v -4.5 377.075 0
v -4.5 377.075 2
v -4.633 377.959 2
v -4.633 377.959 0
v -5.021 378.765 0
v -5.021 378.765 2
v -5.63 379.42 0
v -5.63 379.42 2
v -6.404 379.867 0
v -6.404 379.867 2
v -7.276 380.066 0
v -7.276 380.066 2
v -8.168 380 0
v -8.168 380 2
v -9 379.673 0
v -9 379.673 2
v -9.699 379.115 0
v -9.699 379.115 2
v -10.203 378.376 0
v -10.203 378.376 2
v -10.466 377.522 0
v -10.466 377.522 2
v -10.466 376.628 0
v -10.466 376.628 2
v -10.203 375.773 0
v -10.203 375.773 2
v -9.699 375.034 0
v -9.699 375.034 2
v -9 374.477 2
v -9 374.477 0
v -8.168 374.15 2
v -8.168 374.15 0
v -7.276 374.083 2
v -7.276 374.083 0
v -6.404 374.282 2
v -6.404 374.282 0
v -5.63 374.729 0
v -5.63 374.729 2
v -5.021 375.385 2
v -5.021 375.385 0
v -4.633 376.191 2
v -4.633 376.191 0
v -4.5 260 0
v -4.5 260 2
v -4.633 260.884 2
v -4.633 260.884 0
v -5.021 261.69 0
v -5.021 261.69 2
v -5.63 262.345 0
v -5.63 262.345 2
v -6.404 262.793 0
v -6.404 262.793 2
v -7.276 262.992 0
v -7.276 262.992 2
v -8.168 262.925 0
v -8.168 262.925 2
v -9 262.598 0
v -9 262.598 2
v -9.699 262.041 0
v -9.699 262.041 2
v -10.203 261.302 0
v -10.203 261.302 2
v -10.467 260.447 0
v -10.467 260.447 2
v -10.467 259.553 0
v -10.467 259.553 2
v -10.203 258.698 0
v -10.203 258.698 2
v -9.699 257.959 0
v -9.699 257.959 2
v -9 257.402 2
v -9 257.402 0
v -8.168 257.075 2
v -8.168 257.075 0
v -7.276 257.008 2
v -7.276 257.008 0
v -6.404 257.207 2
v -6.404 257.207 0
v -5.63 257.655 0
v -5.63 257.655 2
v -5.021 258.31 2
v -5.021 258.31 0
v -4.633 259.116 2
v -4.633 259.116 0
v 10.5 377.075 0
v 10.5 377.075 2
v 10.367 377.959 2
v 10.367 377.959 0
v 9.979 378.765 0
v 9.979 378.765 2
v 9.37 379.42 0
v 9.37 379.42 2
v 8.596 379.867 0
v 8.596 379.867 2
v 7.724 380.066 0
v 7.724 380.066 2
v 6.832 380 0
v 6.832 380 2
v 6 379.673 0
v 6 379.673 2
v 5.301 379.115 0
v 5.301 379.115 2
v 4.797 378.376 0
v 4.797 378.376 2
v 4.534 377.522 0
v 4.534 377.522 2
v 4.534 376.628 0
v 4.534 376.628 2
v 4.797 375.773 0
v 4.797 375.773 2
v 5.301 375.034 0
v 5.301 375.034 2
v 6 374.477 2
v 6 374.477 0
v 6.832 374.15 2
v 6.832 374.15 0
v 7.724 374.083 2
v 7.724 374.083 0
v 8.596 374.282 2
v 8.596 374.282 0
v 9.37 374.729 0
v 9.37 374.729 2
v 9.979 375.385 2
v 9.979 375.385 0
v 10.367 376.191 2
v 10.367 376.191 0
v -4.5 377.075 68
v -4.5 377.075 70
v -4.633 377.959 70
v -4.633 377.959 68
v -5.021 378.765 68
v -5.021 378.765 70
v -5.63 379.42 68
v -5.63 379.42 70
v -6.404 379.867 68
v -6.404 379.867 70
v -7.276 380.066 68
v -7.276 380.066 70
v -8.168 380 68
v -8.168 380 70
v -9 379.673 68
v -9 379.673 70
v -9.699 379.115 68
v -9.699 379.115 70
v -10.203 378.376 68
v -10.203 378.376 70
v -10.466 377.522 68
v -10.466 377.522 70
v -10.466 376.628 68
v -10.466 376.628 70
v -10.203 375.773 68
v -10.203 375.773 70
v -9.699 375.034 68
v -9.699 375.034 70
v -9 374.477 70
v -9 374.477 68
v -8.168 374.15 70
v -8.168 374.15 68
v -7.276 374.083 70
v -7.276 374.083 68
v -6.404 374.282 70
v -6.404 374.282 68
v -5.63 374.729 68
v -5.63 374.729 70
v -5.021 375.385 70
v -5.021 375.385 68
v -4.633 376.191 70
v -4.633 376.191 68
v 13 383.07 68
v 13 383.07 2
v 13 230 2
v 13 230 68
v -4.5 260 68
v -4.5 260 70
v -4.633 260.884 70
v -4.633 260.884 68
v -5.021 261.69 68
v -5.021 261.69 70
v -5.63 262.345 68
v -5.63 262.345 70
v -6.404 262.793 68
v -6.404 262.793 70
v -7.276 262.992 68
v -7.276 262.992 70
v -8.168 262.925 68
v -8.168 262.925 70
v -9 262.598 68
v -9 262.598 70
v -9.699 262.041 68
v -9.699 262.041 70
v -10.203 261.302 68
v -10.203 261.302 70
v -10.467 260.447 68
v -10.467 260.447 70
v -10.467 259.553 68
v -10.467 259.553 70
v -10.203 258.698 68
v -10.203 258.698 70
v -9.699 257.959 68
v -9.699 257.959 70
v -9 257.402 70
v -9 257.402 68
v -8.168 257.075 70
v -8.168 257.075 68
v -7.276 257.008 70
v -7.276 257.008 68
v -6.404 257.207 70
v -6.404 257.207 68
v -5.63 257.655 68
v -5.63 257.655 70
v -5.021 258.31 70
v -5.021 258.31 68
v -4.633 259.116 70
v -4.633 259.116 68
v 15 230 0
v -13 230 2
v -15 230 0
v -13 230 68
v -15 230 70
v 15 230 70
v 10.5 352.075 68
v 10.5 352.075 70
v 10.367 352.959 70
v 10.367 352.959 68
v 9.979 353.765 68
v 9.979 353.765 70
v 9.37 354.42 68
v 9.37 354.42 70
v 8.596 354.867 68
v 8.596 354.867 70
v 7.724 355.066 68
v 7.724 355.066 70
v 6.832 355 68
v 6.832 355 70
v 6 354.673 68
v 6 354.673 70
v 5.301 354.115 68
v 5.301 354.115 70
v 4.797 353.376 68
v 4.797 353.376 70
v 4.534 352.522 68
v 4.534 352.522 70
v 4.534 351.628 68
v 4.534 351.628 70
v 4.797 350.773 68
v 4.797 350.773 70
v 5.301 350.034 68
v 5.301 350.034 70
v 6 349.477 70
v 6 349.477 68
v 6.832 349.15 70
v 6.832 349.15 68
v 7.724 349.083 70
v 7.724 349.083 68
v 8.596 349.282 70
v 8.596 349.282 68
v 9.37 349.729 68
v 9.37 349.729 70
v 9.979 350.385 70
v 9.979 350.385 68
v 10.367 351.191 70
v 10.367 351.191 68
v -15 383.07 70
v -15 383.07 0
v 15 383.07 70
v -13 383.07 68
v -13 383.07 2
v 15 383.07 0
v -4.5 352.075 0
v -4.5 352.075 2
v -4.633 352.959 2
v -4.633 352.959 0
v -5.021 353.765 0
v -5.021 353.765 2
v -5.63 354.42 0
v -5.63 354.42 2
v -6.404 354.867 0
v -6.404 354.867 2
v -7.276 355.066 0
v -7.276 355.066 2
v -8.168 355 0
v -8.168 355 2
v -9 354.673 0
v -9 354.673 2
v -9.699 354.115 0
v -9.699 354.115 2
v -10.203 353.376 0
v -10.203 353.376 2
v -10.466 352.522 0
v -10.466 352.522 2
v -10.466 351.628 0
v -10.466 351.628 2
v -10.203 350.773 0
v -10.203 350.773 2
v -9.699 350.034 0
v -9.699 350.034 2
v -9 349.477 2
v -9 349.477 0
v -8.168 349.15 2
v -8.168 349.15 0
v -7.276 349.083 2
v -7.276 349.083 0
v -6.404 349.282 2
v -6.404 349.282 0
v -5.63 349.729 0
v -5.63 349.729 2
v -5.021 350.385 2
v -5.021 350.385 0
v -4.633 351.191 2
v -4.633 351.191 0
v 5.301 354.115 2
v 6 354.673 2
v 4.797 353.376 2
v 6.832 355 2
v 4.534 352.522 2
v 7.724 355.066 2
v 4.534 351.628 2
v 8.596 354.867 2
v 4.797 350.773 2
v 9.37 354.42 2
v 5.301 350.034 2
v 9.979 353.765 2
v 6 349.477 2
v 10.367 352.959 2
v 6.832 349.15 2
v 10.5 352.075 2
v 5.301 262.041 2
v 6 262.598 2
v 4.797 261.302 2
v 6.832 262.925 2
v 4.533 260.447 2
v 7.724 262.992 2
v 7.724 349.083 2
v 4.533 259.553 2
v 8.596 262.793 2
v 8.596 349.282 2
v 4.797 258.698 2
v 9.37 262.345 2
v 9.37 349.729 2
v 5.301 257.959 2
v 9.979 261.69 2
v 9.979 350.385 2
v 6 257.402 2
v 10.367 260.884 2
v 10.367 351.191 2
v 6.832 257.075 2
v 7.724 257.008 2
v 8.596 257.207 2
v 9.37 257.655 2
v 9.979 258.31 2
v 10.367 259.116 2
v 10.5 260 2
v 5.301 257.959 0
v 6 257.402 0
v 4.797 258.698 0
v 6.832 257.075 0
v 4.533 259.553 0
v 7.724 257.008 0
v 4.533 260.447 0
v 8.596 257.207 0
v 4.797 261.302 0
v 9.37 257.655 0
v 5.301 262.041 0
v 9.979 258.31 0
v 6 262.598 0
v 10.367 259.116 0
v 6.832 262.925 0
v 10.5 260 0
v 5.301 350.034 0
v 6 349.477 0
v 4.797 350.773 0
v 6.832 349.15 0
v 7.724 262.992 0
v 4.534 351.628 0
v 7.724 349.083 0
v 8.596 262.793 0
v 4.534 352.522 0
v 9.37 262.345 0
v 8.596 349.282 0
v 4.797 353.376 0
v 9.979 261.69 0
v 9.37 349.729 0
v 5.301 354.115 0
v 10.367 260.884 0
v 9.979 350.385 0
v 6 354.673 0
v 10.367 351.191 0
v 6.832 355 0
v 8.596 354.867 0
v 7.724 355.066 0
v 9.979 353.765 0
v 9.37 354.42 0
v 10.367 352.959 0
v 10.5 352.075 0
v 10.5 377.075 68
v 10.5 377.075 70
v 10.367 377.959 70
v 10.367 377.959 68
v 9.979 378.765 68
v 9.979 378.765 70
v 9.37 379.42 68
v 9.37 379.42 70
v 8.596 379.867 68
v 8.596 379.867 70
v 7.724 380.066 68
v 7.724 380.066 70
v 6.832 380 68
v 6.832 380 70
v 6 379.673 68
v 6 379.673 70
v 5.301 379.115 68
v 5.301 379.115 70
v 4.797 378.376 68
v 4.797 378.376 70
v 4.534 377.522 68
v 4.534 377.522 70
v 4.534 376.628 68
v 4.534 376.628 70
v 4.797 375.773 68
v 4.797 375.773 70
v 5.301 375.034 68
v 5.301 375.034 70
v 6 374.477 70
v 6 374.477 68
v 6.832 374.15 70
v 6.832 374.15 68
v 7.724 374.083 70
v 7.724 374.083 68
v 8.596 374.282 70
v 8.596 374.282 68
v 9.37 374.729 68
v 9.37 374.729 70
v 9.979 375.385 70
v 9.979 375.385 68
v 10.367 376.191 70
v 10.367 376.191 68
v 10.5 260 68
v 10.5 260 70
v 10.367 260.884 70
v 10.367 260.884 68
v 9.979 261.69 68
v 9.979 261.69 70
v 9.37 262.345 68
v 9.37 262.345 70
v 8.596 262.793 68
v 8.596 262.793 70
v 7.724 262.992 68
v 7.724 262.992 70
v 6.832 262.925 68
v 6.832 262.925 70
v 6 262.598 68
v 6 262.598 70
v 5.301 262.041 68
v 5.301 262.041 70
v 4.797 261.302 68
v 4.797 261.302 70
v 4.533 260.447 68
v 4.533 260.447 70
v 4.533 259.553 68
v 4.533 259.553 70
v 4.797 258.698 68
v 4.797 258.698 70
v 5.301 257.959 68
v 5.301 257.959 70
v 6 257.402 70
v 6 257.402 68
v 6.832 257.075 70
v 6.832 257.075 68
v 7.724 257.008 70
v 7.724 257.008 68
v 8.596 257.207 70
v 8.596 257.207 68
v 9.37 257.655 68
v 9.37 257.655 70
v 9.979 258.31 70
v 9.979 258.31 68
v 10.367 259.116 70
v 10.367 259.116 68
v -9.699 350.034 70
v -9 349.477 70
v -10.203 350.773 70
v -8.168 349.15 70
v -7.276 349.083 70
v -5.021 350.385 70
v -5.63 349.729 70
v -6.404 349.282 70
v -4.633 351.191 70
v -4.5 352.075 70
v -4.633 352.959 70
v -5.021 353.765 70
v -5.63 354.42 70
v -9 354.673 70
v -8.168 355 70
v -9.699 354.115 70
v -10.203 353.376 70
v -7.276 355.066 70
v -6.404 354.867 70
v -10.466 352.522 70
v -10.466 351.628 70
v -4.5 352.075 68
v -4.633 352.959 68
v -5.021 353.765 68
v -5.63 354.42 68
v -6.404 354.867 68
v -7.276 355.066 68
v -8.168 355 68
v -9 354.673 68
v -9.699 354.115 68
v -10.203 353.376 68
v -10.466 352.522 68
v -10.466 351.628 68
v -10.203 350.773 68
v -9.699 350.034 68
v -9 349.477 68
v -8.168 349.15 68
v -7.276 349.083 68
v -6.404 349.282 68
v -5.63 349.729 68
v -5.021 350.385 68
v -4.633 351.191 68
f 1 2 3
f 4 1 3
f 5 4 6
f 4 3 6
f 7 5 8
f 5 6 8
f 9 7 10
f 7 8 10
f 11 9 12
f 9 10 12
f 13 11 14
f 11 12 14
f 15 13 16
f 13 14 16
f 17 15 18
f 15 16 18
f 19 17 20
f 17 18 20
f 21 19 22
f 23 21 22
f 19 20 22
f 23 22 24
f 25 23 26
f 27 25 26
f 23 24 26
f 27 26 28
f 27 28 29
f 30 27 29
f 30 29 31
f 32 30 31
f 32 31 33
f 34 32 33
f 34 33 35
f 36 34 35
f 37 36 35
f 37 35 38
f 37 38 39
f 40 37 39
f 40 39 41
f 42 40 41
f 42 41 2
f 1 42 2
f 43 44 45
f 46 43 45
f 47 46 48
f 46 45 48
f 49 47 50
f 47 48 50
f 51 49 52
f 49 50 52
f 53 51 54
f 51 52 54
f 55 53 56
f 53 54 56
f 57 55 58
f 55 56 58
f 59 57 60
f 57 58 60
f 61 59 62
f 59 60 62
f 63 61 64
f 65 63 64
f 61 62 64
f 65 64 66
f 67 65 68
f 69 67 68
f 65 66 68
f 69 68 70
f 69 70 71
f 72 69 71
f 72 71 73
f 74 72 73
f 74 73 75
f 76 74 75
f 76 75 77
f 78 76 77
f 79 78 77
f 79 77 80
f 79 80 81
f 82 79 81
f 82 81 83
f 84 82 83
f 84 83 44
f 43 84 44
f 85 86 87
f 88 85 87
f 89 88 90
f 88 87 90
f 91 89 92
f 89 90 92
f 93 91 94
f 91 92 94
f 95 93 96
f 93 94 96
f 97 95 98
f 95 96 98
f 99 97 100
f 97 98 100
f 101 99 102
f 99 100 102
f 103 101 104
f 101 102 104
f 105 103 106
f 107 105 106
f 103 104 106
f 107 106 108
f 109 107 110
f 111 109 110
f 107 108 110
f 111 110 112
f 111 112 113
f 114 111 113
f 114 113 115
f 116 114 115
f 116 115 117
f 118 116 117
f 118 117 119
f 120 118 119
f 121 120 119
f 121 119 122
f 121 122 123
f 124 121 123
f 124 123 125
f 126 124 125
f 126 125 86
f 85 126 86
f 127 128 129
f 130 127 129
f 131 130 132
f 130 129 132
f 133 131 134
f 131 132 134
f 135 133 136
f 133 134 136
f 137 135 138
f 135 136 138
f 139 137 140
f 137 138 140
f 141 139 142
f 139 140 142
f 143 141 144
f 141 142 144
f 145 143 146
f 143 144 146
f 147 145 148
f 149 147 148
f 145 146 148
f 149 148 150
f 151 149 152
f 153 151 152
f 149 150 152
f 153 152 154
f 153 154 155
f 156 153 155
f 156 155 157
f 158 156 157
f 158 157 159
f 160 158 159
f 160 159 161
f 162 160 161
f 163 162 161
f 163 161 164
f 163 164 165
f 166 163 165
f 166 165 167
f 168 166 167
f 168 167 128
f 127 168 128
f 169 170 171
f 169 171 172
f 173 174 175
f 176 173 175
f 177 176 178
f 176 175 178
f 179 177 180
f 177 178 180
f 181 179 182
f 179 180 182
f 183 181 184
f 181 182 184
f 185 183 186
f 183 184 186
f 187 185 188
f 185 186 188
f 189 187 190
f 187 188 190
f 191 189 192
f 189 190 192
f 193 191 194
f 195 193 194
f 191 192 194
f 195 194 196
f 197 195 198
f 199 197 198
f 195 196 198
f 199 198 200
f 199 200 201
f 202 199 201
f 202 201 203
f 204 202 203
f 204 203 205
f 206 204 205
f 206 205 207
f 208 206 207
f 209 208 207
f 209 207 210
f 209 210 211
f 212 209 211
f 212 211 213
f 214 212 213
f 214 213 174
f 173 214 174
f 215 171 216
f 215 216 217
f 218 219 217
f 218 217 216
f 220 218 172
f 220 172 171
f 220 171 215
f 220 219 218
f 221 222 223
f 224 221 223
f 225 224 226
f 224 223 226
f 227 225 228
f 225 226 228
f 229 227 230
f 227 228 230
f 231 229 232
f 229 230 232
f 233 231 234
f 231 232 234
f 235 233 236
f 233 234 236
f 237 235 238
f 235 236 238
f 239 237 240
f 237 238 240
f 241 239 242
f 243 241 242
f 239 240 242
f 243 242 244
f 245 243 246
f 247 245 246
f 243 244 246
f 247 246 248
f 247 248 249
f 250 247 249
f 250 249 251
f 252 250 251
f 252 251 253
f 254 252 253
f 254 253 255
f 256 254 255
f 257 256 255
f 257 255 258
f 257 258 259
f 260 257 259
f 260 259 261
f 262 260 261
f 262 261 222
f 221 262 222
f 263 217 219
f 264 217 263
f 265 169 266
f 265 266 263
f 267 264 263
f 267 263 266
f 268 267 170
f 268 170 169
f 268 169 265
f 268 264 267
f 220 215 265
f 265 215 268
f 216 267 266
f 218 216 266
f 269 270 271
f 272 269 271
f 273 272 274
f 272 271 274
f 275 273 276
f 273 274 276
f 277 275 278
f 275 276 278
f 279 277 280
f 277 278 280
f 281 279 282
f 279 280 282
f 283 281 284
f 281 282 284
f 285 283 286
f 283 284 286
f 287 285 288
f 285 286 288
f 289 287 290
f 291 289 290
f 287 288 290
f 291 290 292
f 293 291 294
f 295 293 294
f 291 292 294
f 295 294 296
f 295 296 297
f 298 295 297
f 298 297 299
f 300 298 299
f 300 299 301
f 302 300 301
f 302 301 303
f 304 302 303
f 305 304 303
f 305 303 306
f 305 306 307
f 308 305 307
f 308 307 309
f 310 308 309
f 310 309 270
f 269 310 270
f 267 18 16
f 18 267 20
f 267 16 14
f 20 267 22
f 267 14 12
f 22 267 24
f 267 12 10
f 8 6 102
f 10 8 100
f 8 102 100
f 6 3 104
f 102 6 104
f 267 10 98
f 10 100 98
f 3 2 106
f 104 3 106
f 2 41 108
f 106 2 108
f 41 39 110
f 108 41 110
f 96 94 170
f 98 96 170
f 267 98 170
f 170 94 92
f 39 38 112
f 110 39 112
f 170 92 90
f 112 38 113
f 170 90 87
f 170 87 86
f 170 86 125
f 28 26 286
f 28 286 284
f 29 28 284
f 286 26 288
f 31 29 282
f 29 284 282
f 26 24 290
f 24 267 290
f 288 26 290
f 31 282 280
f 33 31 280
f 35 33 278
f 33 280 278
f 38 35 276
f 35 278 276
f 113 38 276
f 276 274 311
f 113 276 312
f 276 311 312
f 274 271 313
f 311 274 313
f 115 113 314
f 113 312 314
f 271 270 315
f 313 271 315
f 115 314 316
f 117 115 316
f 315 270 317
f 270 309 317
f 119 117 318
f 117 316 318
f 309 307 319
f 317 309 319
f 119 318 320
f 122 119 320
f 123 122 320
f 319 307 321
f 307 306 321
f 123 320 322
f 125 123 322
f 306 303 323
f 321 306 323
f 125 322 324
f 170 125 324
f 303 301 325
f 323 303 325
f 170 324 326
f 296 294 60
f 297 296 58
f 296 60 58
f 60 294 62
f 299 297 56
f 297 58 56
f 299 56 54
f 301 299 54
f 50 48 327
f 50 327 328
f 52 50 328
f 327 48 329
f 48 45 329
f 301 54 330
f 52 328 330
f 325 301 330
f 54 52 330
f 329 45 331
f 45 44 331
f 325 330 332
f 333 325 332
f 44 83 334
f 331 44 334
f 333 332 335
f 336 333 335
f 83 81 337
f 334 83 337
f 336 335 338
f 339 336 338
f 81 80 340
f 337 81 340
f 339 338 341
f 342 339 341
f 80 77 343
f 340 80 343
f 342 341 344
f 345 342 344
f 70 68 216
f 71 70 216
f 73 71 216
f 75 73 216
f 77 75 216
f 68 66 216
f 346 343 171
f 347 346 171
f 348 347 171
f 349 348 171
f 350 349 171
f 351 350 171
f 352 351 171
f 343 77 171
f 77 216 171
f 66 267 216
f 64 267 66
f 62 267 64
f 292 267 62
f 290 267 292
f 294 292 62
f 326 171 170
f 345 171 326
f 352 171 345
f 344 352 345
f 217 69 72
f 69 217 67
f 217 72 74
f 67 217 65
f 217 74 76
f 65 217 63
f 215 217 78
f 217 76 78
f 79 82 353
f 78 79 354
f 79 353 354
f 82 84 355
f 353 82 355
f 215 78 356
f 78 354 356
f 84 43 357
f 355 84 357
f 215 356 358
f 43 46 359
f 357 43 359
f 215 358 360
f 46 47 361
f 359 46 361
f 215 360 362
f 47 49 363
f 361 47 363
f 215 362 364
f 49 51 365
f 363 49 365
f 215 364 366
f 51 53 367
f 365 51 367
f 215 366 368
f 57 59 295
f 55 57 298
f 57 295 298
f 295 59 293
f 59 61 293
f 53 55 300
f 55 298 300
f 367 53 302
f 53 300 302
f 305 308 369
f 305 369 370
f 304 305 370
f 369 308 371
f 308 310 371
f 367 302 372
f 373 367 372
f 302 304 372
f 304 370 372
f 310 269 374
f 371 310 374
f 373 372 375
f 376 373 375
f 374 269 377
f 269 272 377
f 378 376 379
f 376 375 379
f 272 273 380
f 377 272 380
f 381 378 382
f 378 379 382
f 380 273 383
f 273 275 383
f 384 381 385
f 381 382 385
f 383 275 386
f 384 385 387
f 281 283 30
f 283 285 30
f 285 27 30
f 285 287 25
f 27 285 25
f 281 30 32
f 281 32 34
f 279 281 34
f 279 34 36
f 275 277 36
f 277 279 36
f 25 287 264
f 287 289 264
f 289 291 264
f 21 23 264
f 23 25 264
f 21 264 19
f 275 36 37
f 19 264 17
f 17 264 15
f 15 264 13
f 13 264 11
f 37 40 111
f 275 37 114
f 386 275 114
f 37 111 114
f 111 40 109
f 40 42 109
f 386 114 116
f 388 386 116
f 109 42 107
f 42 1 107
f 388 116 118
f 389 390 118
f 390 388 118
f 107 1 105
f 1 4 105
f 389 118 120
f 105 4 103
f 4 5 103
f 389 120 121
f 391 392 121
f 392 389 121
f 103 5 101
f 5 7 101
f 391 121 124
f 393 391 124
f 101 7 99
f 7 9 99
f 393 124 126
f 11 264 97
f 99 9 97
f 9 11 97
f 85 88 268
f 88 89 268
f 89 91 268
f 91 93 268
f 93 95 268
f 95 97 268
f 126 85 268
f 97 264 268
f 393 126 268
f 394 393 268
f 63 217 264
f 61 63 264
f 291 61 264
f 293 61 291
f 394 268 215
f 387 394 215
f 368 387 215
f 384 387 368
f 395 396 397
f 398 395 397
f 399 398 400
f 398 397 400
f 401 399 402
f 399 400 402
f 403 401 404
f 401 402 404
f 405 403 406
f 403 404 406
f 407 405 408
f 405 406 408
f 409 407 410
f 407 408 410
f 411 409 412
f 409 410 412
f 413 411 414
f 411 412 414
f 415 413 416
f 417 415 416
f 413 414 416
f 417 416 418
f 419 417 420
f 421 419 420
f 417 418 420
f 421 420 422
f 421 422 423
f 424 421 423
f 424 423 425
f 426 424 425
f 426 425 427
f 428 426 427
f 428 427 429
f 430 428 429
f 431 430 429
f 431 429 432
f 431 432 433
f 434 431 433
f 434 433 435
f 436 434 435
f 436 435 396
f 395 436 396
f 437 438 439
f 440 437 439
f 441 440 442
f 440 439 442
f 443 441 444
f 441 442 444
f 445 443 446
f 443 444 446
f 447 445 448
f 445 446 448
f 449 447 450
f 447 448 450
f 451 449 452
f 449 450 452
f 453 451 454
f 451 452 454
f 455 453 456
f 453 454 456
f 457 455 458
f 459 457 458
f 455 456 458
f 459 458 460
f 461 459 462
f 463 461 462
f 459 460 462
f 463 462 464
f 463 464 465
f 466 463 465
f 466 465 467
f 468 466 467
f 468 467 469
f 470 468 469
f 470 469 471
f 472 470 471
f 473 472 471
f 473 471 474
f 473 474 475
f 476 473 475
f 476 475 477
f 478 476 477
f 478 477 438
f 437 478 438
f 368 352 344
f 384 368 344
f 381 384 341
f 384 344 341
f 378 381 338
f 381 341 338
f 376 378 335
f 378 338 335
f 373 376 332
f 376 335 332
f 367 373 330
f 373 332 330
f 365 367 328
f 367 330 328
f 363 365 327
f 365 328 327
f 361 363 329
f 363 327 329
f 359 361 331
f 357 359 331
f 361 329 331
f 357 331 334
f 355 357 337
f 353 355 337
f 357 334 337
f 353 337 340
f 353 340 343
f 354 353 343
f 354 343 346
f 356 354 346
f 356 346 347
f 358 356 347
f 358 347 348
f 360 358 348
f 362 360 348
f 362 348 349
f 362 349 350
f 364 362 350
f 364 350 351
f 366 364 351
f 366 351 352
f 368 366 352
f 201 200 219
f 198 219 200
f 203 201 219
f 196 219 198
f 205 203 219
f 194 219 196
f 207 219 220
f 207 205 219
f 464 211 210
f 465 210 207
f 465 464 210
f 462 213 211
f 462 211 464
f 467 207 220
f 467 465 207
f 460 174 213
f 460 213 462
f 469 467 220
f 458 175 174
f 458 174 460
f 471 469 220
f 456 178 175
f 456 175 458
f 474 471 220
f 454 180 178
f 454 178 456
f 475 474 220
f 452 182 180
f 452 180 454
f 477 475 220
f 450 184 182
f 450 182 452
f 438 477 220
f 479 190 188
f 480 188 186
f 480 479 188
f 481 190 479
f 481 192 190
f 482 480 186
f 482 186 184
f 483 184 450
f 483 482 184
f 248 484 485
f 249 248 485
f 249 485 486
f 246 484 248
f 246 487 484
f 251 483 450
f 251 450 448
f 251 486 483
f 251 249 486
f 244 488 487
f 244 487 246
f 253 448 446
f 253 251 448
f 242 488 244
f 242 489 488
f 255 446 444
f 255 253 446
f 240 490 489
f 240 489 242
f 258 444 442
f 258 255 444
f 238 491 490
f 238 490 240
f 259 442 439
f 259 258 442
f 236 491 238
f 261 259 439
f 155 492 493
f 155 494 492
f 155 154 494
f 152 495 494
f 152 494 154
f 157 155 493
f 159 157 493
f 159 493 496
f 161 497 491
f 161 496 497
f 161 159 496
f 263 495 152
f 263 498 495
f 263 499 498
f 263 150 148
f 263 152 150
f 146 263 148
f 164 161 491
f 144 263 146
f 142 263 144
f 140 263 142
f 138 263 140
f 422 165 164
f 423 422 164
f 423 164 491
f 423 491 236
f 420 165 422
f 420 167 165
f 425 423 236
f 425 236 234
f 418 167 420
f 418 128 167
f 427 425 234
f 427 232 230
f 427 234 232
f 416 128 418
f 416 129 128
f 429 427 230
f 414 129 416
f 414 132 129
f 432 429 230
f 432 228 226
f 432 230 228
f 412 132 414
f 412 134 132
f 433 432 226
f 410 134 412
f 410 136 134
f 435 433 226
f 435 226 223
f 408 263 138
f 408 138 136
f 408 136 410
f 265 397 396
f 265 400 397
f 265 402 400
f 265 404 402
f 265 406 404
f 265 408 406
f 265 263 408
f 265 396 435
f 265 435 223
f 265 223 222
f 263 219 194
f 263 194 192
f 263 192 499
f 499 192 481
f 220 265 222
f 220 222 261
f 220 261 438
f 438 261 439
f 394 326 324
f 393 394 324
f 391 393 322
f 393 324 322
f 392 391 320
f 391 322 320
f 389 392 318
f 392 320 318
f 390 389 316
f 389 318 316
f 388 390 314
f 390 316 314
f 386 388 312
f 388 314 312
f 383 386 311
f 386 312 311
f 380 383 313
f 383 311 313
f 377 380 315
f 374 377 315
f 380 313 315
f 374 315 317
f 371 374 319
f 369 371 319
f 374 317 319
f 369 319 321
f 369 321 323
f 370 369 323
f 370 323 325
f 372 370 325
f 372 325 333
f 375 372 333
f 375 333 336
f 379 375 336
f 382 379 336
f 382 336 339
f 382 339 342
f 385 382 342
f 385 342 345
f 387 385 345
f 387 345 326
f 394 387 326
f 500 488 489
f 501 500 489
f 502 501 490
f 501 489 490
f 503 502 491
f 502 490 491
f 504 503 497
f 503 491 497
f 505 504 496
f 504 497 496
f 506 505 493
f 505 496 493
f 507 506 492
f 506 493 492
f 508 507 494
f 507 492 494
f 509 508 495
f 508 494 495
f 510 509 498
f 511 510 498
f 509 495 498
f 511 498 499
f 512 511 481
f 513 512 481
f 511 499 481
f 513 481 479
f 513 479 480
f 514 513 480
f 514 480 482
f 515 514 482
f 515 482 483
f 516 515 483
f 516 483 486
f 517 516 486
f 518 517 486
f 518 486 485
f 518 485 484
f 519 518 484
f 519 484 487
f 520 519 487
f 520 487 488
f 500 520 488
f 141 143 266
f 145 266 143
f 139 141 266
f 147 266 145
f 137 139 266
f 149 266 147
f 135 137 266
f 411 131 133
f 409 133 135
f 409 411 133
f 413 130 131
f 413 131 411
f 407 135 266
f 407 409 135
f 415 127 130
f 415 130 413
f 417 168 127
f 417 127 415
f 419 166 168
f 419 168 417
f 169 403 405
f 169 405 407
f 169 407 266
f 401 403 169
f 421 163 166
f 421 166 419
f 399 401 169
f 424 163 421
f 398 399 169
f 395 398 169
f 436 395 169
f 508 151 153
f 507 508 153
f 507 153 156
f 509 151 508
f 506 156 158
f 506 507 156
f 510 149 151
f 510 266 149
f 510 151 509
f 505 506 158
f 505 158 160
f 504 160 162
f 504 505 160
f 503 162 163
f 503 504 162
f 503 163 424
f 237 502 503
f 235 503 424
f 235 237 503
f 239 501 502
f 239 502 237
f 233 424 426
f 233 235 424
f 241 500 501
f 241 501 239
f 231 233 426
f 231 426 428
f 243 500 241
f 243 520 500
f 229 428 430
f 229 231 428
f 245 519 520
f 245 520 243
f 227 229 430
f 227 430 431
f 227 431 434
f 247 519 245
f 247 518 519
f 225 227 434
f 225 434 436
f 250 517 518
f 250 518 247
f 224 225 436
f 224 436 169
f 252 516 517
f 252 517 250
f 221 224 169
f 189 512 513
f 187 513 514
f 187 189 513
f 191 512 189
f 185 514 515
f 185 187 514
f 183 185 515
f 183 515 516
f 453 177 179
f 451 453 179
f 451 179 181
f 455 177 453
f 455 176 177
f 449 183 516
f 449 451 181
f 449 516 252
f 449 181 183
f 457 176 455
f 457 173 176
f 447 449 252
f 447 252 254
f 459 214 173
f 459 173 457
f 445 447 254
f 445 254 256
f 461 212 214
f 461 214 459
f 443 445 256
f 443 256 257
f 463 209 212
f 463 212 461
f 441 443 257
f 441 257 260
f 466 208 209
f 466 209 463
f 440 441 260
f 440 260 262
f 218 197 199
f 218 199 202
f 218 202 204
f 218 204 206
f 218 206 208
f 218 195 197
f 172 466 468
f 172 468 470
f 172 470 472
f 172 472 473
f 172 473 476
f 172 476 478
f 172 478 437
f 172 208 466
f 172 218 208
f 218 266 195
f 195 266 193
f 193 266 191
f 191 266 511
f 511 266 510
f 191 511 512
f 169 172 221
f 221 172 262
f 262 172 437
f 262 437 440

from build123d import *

# Parameters (mm, degrees)
SKETCH_1_W          = 30
SKETCH_1_H          = 766.14
SKETCH_1_R          = 2
SKETCH_1_R_2        = 1.999999998
EXTRUDE_2_DEPTH     = 70
SKETCH_2_W          = 26
SKETCH_2_H          = 66
CUT_EXTRUDE_3_DEPTH = 767.14
SKETCH_3_W          = 30
SKETCH_3_H          = 624.936750841
CUT_EXTRUDE_4_DEPTH = 71
SKETCH_4_R          = 3
CUT_EXTRUDE_5_DEPTH = 115


with BuildPart() as part:
    # 草图1 → 凸台-拉伸2 (new body)
    with BuildSketch(Plane.XY):
        Rectangle(SKETCH_1_W, SKETCH_1_H)
        with Locations((-7.500000035, 377.074776011)):
            Circle(SKETCH_1_R, mode=Mode.SUBTRACT)
        with Locations((7.499999965, 377.074776011)):
            Circle(SKETCH_1_R, mode=Mode.SUBTRACT)
        with Locations((-7.500000035, 352.074776011)):
            Circle(SKETCH_1_R, mode=Mode.SUBTRACT)
        with Locations((7.499999965, 352.074776011)):
            Circle(SKETCH_1_R, mode=Mode.SUBTRACT)
        with Locations((7.499878903, 260.000000008)):
            Circle(SKETCH_1_R_2, mode=Mode.SUBTRACT)
        with Locations((-7.500121097, 260.000000008)):
            Circle(SKETCH_1_R_2, mode=Mode.SUBTRACT)
    extrude(amount=EXTRUDE_2_DEPTH)

    # 草图2 → 切除-拉伸3 (cut, through all)
    with BuildSketch(Plane.XZ.offset(383.07)):
        with Locations((0, 35)):
            Rectangle(SKETCH_2_W, SKETCH_2_H)
    extrude(amount=-CUT_EXTRUDE_3_DEPTH, mode=Mode.SUBTRACT)

    # 草图3 → 切除-拉伸4 (cut, through all)
    with BuildSketch(Plane.XY.offset(70)):
        with Locations((0, -82.468375421)):
            Rectangle(SKETCH_3_W, SKETCH_3_H)
    extrude(amount=-CUT_EXTRUDE_4_DEPTH, mode=Mode.SUBTRACT)

    # 草图4 → 切除-拉伸5 (cut)
    with BuildSketch(Plane.XY.offset(70)):
        with Locations((-7.500000035, 377.074776011)):
            Circle(SKETCH_4_R)
        with Locations((7.499999965, 377.074776011)):
            Circle(SKETCH_4_R)
        with Locations((7.499999965, 352.074776011)):
            Circle(SKETCH_4_R)
        with Locations((-7.500000035, 352.074776011)):
            Circle(SKETCH_4_R)
        with Locations((-7.500121097, 260.000000008)):
            Circle(SKETCH_4_R)
        with Locations((7.499878903, 260.000000008)):
            Circle(SKETCH_4_R)
    extrude(amount=-CUT_EXTRUDE_5_DEPTH, mode=Mode.SUBTRACT)


solid = part.part
